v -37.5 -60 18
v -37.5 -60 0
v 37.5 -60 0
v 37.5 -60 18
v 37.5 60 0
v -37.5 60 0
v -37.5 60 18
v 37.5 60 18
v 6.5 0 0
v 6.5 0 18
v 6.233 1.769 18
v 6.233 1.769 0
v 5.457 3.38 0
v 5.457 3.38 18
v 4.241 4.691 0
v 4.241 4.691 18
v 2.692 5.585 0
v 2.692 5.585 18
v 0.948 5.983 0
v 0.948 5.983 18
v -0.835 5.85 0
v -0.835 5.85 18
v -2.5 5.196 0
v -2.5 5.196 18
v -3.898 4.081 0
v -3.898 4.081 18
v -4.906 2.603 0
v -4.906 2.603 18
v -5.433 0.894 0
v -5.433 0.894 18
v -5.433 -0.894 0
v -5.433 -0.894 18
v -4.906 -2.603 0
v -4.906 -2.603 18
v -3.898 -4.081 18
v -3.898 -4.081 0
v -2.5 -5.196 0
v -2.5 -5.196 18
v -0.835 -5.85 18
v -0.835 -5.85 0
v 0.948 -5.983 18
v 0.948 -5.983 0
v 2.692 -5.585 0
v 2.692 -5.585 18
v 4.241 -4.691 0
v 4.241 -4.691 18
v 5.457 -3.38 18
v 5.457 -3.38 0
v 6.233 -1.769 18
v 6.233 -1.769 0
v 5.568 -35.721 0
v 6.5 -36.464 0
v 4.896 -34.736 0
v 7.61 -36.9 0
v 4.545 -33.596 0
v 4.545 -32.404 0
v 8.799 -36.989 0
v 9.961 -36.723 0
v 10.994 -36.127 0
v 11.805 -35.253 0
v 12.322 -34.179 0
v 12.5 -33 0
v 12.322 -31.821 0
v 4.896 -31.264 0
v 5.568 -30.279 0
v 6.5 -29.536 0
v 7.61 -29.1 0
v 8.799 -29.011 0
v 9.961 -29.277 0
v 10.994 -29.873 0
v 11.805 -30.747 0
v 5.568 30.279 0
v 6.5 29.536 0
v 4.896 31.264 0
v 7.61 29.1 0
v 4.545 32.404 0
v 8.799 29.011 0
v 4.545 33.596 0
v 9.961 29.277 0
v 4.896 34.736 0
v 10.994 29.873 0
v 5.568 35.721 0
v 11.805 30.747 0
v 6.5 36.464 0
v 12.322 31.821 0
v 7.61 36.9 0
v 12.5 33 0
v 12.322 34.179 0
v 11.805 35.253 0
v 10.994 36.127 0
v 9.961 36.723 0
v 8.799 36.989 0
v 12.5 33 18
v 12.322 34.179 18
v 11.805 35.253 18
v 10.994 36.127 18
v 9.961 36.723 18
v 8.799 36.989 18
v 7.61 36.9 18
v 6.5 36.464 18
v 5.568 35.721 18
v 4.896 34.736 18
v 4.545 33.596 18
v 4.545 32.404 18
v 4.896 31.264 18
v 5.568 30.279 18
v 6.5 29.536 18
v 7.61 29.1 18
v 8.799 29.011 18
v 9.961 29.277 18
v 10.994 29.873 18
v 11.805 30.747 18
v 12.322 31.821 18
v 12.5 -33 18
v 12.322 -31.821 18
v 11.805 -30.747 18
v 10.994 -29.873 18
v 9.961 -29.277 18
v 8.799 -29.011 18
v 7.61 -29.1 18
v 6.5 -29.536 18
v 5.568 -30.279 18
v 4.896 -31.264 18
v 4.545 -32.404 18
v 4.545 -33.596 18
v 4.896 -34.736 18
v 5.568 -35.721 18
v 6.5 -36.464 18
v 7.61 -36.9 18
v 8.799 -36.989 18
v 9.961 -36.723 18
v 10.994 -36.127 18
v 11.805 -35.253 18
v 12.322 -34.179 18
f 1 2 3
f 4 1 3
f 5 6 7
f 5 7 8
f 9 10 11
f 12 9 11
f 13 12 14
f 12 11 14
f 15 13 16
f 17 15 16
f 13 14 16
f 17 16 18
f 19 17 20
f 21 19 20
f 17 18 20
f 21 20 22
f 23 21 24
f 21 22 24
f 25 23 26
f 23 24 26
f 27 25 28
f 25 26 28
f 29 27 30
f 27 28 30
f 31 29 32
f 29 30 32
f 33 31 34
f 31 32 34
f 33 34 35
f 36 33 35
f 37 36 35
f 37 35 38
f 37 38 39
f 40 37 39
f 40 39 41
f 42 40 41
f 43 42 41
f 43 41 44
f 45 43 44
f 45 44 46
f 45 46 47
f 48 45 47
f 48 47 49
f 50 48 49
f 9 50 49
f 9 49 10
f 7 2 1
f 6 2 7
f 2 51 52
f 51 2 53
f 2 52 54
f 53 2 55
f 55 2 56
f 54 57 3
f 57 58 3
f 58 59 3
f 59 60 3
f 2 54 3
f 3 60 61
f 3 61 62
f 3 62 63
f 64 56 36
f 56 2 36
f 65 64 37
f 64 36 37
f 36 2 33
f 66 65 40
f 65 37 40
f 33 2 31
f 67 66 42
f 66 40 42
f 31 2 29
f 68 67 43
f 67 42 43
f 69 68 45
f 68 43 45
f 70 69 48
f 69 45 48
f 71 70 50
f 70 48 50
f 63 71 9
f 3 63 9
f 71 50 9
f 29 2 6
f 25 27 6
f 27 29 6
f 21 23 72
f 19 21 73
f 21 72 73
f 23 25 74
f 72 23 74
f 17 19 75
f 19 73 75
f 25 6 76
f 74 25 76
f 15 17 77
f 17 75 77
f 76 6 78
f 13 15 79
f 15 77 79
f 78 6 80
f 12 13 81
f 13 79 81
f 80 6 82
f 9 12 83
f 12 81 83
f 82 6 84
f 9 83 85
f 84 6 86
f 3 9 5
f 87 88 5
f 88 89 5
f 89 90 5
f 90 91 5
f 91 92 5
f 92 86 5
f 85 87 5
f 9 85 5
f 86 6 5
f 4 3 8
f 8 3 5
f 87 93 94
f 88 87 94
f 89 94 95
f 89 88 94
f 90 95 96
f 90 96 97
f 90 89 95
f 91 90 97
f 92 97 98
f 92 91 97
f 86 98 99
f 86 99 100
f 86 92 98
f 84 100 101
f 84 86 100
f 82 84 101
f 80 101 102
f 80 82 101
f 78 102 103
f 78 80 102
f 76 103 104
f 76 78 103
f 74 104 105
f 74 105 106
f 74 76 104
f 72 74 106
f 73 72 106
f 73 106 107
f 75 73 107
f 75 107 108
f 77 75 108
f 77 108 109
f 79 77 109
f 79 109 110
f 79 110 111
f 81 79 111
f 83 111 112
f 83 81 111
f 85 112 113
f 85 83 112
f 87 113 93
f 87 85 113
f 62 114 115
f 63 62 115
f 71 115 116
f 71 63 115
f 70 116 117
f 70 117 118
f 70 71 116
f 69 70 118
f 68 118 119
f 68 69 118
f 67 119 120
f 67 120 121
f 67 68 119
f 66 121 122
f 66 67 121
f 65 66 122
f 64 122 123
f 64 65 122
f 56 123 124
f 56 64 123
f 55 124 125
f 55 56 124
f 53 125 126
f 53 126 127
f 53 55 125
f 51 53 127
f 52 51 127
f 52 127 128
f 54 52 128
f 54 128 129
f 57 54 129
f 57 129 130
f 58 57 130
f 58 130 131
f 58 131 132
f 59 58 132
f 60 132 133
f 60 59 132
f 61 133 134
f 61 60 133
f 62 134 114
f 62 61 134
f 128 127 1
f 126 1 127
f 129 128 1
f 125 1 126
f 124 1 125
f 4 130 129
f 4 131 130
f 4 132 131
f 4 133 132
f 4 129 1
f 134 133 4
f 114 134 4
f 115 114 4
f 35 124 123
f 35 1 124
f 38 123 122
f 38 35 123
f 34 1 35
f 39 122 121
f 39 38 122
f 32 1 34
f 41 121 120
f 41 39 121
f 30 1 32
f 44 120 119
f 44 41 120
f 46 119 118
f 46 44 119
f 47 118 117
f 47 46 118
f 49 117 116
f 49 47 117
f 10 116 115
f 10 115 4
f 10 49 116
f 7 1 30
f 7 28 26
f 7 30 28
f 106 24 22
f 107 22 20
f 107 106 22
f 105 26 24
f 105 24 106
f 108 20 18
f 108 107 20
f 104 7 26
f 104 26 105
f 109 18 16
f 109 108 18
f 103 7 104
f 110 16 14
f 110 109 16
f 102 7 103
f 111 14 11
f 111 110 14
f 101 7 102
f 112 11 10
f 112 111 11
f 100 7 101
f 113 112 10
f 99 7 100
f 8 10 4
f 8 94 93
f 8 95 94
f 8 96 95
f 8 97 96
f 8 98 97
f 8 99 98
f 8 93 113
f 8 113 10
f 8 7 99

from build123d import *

# Parameters (mm, degrees)
SKETCH1_W             = 75
SKETCH1_H             = 120
SKETCH1_R             = 4
BOSS_EXTRUDE1_DEPTH   = 18
F_1_0MM_DOWEL_HOLE1_D = 12


with BuildPart() as part:
    # Sketch1 → Boss-Extrude1 (new body)
    with BuildSketch(Plane.XY):
        Rectangle(SKETCH1_W, SKETCH1_H)
        with Locations((8.5, 33)):
            Circle(SKETCH1_R, mode=Mode.SUBTRACT)
        with Locations((8.5, -33)):
            Circle(SKETCH1_R, mode=Mode.SUBTRACT)
    extrude(amount=BOSS_EXTRUDE1_DEPTH)

    # Ø1.0mm Dowel Hole1 (through all)
    with Locations(Plane(origin=(0, 0, 0), x_dir=(-1, 0, 0), z_dir=(0, 0, -1))):
        with Locations((-0.5, 0)):
            Hole(F_1_0MM_DOWEL_HOLE1_D / 2)


solid = part.part
